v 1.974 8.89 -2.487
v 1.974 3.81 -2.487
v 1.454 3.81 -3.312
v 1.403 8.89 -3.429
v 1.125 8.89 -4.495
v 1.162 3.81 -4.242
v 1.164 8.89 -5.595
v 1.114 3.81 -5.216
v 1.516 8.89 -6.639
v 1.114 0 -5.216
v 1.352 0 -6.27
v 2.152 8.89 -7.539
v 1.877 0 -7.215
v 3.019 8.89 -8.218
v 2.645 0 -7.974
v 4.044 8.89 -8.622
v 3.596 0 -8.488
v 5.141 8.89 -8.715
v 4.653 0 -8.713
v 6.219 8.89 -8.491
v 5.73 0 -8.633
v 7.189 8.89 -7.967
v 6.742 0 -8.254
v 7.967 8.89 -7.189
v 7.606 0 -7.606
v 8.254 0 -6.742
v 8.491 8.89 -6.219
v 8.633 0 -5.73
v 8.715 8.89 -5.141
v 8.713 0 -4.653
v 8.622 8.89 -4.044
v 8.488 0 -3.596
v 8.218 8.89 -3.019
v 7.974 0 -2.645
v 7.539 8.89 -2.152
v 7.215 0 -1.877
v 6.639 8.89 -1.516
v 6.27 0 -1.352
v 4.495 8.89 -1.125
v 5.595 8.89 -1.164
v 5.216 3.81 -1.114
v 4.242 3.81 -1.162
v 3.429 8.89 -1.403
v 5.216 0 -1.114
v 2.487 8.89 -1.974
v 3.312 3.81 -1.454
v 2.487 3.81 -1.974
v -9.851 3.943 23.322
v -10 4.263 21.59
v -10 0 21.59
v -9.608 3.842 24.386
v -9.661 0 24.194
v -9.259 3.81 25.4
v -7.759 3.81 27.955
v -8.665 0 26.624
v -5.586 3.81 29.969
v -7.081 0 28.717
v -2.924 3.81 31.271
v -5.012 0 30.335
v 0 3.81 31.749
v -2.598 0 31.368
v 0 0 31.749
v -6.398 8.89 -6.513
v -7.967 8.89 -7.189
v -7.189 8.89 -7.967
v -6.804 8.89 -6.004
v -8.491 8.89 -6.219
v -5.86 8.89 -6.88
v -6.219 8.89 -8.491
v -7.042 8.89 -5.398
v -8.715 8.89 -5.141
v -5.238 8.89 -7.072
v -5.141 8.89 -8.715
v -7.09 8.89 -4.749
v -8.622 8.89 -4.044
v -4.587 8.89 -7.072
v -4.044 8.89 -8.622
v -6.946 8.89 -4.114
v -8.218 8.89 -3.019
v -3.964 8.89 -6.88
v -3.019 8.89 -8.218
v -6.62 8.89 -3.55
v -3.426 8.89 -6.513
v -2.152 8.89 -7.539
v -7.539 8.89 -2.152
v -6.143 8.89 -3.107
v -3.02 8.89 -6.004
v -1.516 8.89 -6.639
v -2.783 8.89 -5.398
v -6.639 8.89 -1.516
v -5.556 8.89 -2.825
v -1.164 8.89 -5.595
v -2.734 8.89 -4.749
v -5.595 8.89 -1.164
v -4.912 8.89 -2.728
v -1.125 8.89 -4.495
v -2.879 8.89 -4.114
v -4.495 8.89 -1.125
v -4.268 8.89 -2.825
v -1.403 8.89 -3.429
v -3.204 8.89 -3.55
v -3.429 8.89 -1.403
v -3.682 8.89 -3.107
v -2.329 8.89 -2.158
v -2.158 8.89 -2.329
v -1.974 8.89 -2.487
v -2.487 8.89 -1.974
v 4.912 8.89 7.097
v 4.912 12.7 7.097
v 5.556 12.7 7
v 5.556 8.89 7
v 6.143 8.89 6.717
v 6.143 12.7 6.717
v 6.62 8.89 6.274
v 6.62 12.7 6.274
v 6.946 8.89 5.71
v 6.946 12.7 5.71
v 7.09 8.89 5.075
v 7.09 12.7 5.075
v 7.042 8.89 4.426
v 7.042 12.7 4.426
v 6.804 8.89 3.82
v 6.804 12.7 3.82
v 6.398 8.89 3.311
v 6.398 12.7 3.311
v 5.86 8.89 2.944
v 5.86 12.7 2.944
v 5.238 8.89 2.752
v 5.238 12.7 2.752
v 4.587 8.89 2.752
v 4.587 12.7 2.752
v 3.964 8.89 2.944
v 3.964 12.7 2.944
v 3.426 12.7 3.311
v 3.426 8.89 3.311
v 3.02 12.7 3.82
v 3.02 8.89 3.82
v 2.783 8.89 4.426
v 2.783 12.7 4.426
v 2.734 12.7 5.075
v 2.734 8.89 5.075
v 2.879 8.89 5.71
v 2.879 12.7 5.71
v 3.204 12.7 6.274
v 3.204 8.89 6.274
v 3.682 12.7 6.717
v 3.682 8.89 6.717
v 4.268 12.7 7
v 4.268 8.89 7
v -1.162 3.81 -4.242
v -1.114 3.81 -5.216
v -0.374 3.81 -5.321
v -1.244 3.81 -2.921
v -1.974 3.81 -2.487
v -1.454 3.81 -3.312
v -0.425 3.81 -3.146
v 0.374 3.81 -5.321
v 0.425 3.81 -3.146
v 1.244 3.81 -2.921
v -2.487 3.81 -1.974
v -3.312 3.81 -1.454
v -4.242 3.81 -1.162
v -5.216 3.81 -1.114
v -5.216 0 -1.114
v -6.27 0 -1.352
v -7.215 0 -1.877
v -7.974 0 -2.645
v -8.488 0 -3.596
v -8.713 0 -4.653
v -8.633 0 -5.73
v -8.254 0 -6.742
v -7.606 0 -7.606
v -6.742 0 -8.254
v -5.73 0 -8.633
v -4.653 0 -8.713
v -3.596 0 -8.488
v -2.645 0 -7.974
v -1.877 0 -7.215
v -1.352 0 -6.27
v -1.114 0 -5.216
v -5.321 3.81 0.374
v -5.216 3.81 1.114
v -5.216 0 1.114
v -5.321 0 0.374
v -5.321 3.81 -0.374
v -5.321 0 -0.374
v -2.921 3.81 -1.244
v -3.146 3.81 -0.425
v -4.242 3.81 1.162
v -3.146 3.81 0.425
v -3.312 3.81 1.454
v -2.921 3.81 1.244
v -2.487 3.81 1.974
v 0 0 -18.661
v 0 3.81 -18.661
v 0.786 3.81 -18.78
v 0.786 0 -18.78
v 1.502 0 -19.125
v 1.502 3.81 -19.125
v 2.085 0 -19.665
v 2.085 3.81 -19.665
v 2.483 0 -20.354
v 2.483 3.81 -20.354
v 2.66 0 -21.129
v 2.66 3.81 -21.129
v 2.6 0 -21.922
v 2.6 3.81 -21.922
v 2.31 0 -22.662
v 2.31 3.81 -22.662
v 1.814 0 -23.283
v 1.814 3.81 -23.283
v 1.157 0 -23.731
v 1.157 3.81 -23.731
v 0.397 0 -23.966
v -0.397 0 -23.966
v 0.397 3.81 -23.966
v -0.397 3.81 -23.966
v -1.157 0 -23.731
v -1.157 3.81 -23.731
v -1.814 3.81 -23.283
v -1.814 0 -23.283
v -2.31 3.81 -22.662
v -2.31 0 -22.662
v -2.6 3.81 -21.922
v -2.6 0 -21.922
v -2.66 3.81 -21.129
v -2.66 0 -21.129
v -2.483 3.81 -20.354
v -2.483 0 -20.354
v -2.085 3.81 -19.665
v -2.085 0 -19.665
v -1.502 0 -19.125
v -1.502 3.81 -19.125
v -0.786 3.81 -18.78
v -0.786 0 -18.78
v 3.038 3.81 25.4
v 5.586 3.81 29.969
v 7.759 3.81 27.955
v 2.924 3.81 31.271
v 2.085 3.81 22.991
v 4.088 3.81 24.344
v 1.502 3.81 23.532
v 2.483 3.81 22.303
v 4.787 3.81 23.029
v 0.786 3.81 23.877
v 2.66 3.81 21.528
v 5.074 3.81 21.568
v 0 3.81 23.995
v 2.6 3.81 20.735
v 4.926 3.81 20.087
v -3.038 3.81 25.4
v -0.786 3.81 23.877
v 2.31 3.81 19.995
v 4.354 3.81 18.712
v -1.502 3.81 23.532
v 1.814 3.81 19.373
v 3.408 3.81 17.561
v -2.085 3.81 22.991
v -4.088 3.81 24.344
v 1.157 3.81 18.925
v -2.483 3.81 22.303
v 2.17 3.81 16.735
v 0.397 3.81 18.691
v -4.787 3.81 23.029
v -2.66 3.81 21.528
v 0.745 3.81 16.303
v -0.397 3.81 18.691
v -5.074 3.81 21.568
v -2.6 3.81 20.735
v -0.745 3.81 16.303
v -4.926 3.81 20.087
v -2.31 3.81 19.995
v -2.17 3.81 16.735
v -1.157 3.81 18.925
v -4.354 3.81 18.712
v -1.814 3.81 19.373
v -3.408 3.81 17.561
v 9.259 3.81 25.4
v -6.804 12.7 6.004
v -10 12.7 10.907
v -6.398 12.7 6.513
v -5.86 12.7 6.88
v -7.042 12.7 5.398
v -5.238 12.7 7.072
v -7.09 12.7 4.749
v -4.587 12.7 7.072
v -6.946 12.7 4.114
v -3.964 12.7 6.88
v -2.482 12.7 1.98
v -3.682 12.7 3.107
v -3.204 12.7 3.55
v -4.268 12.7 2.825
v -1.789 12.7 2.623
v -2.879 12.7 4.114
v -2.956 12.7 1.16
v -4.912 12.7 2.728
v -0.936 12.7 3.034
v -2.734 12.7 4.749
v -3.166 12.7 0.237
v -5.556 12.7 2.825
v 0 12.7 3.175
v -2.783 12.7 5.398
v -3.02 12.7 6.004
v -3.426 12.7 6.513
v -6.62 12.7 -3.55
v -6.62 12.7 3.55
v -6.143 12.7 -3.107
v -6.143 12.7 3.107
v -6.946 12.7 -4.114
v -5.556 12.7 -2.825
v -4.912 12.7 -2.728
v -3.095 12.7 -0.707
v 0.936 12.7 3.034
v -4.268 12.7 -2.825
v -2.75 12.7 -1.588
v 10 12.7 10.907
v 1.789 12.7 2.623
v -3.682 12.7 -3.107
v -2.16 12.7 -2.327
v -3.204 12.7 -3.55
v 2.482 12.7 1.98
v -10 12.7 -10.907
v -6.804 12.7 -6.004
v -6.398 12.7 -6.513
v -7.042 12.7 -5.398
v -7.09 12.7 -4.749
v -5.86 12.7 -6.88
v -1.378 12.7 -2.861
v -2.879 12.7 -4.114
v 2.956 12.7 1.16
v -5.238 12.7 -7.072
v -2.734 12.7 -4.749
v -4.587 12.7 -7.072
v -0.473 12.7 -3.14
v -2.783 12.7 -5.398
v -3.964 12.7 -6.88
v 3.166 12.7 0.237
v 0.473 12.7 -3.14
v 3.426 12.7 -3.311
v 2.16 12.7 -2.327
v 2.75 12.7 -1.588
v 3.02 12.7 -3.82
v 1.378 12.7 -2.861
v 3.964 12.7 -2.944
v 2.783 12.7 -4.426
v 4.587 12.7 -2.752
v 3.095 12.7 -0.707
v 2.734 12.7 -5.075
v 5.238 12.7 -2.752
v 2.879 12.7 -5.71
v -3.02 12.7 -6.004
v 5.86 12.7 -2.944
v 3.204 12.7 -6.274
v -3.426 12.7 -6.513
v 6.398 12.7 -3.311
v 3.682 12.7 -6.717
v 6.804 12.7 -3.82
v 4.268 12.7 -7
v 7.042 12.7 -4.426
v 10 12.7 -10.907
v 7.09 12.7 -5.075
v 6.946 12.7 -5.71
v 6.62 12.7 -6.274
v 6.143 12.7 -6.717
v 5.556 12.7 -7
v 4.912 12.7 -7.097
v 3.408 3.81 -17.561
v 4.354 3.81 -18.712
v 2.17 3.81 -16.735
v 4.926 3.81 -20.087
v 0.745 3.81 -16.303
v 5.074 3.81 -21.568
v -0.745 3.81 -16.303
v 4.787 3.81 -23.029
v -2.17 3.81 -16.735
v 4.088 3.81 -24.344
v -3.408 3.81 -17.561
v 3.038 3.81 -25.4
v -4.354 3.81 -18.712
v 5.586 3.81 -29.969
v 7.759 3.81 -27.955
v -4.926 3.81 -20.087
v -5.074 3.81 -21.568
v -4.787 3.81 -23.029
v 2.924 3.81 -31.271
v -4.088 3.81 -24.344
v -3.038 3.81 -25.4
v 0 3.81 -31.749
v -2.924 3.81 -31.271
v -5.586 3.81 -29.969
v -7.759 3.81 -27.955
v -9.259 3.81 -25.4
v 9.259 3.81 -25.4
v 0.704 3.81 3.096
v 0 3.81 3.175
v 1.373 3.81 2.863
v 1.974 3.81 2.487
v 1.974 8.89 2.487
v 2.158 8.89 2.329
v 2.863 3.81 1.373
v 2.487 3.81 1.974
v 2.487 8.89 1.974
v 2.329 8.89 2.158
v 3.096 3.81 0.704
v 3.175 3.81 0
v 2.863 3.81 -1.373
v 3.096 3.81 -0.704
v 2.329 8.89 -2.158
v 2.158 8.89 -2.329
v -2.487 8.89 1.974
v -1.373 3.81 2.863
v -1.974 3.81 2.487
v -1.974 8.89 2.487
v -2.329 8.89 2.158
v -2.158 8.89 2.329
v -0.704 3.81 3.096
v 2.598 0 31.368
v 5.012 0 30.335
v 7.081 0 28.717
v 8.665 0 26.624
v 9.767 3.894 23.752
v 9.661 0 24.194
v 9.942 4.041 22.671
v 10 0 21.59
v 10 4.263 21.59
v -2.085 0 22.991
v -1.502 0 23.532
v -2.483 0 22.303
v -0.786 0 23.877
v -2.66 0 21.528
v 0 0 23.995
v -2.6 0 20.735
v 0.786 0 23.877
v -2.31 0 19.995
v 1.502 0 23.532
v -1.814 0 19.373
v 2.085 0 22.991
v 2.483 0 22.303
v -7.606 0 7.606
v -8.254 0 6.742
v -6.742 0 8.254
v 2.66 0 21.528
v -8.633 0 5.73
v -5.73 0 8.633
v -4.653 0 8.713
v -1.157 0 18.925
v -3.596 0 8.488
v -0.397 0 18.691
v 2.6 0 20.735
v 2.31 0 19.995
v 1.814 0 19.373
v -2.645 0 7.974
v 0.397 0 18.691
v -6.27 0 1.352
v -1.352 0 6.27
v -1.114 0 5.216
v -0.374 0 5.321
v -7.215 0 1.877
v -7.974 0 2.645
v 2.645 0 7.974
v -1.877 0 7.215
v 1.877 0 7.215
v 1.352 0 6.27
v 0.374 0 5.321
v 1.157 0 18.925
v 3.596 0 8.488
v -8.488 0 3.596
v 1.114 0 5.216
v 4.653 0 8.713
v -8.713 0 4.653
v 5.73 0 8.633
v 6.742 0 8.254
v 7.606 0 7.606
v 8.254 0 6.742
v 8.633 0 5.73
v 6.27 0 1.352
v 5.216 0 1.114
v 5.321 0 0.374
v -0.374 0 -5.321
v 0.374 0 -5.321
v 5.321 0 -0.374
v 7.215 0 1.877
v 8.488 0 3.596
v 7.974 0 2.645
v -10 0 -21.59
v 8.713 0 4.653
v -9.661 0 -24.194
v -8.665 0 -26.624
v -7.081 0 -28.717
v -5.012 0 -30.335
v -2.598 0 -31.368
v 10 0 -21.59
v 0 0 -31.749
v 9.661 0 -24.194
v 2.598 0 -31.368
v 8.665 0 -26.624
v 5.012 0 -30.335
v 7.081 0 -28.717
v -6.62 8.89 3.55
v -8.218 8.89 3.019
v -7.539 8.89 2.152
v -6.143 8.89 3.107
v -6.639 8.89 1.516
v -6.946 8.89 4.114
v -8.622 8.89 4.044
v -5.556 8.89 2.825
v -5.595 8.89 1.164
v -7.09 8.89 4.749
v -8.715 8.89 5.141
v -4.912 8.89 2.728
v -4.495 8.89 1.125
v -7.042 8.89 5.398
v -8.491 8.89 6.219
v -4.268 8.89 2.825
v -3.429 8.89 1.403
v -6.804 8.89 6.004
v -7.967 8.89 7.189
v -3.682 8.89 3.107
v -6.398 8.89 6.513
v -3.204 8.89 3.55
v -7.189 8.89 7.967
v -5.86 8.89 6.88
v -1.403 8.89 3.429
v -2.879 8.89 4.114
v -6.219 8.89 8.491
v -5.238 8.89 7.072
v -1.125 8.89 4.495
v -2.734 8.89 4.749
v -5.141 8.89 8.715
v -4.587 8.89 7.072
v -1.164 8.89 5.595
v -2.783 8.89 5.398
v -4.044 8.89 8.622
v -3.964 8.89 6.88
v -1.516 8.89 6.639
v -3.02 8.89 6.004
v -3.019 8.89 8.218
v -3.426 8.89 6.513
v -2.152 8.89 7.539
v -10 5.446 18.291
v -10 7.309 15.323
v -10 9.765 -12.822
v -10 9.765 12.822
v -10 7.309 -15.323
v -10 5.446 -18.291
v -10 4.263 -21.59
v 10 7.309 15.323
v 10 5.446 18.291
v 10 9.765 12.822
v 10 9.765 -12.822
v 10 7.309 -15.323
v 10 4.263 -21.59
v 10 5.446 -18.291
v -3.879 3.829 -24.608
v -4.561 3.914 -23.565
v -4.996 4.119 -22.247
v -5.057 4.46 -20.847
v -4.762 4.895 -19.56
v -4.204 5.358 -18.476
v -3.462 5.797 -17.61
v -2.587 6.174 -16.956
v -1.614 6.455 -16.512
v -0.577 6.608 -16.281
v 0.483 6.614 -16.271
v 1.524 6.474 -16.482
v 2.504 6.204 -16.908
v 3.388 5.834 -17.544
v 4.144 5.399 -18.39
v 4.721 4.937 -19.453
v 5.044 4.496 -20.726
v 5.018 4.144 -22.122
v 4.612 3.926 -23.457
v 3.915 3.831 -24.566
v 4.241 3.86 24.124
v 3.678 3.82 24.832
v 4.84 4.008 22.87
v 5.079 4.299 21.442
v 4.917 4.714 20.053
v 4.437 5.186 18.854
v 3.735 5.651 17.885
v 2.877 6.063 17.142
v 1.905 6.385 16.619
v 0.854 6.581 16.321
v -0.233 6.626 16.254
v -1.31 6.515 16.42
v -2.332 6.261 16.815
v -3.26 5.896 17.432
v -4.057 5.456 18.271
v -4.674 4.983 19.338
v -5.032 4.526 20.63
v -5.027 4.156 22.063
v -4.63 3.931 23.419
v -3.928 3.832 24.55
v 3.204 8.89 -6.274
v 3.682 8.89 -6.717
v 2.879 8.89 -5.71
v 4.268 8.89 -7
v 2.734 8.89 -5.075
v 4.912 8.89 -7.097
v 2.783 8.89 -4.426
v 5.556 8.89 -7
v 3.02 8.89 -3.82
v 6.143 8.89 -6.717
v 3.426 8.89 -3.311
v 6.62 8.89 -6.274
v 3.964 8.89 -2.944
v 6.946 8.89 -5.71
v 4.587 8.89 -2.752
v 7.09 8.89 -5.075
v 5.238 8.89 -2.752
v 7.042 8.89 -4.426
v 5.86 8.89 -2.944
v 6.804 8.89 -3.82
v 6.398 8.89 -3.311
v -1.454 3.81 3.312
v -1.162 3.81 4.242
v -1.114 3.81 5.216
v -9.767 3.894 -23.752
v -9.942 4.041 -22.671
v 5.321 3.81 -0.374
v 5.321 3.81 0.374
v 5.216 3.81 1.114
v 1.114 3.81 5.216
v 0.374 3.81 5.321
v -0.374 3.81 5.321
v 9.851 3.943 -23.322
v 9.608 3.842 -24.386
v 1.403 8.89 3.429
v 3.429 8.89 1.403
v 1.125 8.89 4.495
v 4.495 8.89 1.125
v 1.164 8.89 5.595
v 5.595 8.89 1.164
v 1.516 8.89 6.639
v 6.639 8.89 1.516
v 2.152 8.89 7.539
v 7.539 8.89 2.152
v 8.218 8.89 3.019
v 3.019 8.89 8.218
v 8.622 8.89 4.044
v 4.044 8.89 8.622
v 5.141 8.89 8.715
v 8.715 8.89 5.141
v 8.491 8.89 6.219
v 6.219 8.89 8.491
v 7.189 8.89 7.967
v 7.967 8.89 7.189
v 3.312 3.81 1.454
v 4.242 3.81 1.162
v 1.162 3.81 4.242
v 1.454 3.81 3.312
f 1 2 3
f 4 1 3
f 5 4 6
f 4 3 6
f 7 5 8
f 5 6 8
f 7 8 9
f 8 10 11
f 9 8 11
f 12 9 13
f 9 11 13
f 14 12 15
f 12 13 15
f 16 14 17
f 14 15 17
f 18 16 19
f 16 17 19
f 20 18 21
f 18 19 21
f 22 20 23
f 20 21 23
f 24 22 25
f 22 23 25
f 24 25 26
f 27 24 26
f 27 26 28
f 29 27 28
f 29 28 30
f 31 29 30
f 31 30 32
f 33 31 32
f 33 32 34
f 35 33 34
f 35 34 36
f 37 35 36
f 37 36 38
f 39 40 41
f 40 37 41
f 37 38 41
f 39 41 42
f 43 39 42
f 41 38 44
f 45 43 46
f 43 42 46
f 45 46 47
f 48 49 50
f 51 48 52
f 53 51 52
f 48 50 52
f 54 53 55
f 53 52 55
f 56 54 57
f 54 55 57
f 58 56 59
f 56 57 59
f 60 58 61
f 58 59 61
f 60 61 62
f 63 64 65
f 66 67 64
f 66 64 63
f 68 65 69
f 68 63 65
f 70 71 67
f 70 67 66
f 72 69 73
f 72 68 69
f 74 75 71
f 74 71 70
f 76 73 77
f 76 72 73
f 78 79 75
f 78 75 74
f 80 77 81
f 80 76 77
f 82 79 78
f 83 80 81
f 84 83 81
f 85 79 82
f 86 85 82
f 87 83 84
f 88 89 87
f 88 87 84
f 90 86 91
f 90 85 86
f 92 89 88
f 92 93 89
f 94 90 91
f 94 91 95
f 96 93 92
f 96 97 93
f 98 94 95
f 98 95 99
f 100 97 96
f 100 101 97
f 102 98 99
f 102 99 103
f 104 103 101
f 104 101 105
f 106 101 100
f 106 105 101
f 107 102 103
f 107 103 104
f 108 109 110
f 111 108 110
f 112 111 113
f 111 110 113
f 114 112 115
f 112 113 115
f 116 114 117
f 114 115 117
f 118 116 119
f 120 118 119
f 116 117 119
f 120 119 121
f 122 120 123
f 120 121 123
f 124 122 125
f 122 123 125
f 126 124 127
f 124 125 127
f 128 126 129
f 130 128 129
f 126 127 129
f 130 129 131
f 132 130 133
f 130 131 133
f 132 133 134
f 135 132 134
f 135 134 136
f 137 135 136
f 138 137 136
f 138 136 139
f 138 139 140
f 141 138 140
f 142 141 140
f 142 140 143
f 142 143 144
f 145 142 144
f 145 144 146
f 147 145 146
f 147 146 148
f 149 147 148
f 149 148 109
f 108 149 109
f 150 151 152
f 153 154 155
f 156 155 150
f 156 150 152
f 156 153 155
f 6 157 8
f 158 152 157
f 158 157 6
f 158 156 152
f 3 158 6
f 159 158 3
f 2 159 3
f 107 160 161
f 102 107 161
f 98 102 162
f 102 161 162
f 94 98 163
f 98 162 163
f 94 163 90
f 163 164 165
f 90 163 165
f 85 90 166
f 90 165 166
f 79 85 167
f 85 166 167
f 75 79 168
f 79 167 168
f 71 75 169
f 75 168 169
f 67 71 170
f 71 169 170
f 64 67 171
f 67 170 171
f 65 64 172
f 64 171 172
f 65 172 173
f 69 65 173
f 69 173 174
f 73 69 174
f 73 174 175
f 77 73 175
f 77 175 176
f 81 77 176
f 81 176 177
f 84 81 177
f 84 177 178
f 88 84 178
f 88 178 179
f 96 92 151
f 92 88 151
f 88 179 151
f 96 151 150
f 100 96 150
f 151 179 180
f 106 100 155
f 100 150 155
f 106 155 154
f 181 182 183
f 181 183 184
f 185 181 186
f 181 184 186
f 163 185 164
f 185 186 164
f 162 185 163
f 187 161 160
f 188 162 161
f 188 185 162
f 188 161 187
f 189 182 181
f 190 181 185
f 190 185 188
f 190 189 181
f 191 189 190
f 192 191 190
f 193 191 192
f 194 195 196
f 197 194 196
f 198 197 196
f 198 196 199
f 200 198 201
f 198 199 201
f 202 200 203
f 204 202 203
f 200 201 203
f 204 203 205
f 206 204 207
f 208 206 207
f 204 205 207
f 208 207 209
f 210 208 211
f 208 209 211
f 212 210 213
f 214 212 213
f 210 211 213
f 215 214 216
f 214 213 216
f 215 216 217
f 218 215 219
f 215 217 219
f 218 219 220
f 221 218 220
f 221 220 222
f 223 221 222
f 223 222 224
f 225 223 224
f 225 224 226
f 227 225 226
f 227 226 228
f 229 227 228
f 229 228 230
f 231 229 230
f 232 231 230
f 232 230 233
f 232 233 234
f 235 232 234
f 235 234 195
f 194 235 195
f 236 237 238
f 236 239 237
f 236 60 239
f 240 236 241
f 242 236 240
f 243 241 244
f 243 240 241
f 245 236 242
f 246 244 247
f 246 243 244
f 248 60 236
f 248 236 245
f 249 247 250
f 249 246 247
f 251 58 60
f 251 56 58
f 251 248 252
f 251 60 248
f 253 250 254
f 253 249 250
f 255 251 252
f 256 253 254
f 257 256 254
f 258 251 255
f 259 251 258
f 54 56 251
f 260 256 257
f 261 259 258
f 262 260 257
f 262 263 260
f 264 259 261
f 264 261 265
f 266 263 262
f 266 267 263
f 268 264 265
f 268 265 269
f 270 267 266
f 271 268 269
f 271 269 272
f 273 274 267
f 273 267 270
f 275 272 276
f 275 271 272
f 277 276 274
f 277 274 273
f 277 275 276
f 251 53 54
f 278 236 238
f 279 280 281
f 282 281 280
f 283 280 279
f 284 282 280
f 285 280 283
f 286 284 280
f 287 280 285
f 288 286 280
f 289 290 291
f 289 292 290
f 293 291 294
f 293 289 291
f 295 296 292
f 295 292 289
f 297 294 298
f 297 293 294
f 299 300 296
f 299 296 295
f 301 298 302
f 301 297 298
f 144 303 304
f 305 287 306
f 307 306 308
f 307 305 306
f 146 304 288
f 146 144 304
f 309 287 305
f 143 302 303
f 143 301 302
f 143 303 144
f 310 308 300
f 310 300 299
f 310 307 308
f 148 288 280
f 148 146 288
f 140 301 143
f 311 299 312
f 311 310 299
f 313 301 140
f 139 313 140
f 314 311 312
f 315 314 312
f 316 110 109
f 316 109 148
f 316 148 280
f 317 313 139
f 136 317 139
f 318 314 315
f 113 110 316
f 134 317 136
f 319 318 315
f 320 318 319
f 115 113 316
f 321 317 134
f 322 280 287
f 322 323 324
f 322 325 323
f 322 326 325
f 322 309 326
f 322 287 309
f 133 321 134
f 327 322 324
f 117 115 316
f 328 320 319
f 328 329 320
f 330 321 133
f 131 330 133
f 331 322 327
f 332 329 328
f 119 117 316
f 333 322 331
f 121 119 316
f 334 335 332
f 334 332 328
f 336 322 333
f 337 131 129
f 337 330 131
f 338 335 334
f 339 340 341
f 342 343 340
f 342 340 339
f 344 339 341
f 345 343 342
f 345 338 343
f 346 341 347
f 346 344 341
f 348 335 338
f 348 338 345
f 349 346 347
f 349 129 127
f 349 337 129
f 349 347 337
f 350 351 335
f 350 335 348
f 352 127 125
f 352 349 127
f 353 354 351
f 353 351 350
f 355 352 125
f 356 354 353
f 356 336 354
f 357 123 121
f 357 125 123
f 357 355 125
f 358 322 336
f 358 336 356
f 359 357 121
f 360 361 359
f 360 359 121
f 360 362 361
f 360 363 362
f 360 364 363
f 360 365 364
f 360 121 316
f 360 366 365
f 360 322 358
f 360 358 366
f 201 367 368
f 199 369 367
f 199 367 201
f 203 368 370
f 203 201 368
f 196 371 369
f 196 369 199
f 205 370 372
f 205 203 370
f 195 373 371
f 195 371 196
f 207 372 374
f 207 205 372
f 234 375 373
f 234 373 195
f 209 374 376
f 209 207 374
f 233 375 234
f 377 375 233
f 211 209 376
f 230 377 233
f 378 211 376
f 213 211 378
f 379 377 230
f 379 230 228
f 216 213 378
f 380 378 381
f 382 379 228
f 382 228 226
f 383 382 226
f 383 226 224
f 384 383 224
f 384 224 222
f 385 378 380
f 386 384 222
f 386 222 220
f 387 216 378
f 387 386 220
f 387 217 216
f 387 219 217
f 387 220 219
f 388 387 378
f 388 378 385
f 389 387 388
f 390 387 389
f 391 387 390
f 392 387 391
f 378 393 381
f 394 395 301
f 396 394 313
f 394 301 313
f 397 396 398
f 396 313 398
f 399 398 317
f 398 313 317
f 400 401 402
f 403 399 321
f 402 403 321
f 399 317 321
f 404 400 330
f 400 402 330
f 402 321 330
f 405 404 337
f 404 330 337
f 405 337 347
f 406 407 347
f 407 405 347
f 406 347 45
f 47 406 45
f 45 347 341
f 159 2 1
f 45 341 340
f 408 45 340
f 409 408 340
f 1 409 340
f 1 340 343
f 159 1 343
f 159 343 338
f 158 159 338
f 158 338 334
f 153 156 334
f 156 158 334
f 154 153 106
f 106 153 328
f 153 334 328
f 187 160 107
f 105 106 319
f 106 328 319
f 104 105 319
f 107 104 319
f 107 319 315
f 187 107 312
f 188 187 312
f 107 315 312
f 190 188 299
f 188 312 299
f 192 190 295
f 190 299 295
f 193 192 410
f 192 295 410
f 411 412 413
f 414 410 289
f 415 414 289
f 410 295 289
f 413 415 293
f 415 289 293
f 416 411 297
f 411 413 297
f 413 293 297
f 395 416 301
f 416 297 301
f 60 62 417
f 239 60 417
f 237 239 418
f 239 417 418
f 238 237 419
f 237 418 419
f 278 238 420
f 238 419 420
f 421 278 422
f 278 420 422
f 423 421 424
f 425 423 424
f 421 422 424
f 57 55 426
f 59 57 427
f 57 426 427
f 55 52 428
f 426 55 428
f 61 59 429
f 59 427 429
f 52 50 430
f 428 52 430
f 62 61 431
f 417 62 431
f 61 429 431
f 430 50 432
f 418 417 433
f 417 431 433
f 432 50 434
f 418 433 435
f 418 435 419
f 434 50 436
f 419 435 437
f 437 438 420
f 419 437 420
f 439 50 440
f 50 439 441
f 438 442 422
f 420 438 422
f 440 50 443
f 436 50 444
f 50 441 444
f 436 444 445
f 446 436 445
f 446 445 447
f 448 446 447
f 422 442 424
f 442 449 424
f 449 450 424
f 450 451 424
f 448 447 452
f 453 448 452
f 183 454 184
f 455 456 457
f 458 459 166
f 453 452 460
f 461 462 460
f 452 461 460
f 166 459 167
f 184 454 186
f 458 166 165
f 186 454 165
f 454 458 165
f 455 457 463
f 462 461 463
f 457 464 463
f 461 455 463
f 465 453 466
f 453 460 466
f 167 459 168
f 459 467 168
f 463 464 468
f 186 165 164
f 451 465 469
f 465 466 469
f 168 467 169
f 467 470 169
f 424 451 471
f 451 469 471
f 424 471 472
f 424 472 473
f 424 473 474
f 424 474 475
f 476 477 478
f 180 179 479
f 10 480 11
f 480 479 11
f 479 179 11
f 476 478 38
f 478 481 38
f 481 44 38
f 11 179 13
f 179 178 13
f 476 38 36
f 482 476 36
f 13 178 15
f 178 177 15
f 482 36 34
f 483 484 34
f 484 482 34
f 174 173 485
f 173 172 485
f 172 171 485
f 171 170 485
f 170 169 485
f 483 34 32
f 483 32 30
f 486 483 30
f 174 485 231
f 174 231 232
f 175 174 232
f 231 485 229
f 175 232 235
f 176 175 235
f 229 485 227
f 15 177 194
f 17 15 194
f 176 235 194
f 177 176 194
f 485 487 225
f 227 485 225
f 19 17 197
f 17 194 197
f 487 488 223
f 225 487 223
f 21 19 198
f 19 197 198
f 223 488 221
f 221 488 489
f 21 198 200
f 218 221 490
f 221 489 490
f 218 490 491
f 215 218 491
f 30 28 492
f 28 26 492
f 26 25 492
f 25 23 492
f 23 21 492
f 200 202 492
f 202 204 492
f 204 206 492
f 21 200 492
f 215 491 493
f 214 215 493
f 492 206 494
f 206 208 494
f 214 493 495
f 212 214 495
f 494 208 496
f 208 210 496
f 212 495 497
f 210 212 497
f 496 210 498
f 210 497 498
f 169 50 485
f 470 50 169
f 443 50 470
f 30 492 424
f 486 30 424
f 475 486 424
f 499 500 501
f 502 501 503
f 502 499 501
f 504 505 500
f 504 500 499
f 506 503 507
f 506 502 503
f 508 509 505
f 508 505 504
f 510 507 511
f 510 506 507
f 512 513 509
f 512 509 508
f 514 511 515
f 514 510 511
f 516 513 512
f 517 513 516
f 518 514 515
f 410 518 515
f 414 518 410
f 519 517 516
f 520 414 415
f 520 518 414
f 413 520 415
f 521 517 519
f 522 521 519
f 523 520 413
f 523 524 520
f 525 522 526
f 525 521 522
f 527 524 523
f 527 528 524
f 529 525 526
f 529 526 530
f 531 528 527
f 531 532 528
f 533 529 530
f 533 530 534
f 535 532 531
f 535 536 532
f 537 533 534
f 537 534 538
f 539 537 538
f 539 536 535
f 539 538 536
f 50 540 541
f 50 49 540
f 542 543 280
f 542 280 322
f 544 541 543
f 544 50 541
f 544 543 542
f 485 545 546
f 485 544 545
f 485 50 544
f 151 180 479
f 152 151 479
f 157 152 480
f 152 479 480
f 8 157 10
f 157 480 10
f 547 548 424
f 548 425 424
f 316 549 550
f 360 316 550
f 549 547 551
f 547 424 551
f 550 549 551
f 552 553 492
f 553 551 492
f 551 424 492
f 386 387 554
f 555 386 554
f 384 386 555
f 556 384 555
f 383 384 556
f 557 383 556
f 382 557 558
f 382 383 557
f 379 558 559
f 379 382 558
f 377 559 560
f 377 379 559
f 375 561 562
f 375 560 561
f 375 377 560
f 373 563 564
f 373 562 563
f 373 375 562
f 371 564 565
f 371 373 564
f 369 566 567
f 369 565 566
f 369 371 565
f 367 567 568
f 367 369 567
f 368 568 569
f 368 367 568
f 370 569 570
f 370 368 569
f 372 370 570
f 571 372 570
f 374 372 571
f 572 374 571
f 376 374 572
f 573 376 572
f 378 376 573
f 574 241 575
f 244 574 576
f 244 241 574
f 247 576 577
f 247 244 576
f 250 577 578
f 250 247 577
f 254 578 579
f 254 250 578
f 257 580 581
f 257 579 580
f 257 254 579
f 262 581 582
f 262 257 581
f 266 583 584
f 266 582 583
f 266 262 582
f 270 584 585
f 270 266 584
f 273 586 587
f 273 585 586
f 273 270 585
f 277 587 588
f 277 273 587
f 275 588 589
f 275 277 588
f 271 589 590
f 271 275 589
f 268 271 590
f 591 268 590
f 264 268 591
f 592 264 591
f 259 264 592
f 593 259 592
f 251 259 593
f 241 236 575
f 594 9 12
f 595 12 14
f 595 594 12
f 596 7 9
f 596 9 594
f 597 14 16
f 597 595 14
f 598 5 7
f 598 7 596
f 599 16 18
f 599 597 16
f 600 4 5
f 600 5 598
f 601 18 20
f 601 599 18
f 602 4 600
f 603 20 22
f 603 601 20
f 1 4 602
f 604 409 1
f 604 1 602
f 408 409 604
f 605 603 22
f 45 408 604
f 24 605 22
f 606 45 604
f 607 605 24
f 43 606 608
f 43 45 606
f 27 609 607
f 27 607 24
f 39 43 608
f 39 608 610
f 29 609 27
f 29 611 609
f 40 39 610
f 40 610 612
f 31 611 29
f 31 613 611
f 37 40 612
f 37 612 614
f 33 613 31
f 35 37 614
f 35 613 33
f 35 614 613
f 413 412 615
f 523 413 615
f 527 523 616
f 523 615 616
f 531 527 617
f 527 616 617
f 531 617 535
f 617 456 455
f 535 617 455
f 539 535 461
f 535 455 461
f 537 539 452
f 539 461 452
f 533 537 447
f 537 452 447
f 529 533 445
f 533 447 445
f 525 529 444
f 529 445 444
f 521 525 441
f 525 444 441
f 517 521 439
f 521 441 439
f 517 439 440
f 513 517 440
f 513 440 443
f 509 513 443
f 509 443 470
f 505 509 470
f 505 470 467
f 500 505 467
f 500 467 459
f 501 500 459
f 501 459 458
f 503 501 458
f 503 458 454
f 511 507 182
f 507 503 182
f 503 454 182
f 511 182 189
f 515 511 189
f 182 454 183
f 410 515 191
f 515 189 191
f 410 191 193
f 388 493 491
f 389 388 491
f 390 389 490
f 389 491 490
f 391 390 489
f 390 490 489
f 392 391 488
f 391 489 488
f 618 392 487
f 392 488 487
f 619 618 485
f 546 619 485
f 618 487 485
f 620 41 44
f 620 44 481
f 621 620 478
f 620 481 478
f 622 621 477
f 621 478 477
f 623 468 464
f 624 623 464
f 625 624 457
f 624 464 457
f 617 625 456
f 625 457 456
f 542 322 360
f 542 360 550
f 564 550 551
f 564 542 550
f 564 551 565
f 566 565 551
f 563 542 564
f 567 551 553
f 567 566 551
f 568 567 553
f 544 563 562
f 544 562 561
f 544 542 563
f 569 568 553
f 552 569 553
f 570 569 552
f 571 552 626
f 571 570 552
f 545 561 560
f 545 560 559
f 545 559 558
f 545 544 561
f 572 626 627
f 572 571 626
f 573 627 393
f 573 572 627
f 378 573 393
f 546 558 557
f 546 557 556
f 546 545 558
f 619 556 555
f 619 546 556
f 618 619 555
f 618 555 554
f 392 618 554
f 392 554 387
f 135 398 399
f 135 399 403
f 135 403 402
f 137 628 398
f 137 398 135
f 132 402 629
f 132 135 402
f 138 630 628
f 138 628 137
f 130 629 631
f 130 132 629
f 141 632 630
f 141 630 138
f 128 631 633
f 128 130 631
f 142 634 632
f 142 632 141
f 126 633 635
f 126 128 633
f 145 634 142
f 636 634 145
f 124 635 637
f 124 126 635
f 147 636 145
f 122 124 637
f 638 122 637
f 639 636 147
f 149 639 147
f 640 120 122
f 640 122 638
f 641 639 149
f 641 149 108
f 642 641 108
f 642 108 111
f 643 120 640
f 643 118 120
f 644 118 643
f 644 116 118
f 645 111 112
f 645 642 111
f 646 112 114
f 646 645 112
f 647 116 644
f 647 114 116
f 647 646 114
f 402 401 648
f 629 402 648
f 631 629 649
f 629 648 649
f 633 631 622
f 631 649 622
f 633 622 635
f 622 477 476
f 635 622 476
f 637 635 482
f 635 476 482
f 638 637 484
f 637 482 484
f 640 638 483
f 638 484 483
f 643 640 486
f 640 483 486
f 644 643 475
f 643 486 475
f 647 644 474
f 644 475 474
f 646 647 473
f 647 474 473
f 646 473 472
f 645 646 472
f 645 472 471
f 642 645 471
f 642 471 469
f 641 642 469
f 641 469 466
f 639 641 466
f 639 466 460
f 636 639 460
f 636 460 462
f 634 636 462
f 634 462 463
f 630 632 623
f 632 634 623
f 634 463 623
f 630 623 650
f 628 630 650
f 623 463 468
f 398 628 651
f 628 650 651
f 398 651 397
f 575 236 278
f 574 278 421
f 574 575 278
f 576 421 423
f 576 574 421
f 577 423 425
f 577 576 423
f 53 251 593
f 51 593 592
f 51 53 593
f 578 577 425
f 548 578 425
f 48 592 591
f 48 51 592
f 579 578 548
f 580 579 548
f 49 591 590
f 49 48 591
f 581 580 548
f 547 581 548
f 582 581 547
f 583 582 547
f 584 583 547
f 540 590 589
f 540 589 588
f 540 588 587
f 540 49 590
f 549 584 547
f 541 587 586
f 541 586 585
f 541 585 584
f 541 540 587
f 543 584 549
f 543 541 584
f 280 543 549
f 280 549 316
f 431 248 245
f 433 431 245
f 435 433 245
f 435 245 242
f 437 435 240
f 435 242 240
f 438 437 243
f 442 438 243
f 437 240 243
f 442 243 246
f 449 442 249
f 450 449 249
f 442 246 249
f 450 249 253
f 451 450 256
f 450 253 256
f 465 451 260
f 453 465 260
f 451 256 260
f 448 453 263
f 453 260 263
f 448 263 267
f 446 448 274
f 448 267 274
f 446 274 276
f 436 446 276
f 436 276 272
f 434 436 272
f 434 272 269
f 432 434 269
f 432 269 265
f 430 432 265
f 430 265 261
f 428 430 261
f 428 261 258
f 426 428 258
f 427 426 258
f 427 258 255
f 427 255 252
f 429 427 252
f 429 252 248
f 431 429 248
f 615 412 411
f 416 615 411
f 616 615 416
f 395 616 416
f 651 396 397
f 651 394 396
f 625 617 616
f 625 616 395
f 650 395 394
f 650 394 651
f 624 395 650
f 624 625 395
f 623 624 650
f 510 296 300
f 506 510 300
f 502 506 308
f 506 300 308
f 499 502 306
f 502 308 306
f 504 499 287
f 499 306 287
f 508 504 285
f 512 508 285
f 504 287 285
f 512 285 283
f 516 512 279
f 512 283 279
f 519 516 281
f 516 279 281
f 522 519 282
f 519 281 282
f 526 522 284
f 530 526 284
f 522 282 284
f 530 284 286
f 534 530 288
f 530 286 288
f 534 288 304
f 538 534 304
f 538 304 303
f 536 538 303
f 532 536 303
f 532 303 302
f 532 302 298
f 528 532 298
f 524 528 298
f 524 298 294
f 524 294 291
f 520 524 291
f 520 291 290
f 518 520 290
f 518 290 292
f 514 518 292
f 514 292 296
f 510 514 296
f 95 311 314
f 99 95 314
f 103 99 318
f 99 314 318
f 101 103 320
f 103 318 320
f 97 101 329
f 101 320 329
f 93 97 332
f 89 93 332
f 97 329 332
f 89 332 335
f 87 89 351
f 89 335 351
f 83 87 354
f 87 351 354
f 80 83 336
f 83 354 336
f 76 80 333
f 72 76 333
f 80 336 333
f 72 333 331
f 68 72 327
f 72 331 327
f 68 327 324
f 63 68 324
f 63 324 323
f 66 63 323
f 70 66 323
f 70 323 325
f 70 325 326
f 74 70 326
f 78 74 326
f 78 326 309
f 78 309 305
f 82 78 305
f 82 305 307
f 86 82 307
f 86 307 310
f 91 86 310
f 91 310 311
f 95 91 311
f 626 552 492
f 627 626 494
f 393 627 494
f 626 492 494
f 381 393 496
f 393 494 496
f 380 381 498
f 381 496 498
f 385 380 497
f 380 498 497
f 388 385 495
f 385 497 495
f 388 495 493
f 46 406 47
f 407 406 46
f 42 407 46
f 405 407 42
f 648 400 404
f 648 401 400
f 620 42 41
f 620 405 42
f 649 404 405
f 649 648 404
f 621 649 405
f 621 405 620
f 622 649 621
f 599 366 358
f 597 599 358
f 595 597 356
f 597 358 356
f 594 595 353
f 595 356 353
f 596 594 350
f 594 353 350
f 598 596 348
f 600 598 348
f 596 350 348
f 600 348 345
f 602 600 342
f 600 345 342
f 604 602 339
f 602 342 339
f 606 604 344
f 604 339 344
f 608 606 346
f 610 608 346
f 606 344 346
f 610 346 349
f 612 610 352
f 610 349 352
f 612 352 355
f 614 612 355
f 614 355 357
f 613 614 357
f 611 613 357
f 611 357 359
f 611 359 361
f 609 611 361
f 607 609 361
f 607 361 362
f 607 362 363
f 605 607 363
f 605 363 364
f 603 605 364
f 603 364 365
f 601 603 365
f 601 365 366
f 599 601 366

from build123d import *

# Parameters (mm, degrees)
SKETCH1_W               = 20
SKETCH1_H               = 63.5
BOSS_EXTRUDE1_DEPTH     = 12.7
SKETCH2_R               = 3.175
SKETCH2_R_2             = 2.1844
CUT_EXTRUDE1_DEPTH      = 36.62797356
CUT_EXTRUDE2_DEPTH      = 36.62797356
CUT_EXTRUDE2_DEPTH_BACK = 36.62797356
SKETCH4_R               = 3.81
CUT_EXTRUDE3_DEPTH      = 8.89
SKETCH4_3_R             = 3.81
SKETCH4_3_R_2           = 2.1844
SKETCH4_3_R_3           = 5.334
SKETCH4_3_R_4           = 3.175
CUT_EXTRUDE4_DEPTH      = 3.81
SKETCH6_R               = 5.08
SKETCH6_R_2             = 2.667
CUT_EXTRUDE5_DEPTH      = 8.89
SKETCH6_4_R             = 2.667
CUT_EXTRUDE6_DEPTH      = 35.454239272
FILLET1_R               = 10.16


with BuildPart() as part:
    # Sketch1 → Boss-Extrude1 (new body)
    with BuildSketch(Plane(origin=(0, 0, 0), x_dir=(1, 0, 0), z_dir=(0, 1, 0))):
        Rectangle(SKETCH1_W, SKETCH1_H)
    extrude(amount=BOSS_EXTRUDE1_DEPTH)

    # Sketch2 → Cut-Extrude1 (cut, through all)
    with BuildSketch(Plane(origin=(0, 12.7, 0), x_dir=(1, 0, 0), z_dir=(0, 1, 0))):
        with Locations(Location((0, 0, 0), (0, 0, 270))):
            Circle(SKETCH2_R)
        with Locations(Location((-4.912200098, 4.912200098, 0), (0, 0, 270))):
            Circle(SKETCH2_R_2)
        with Locations(Location((4.912200098, -4.912200098, 0), (0, 0, 270))):
            Circle(SKETCH2_R_2)
        with Locations(Location((4.912200098, 4.912200098, 0), (0, 0, 90))):
            Circle(SKETCH2_R_2)
        with Locations(Location((-4.912200098, -4.912200098, 0), (0, 0, 90))):
            Circle(SKETCH2_R_2)
    extrude(amount=-CUT_EXTRUDE1_DEPTH, mode=Mode.SUBTRACT)

    # Sketch3 → Cut-Extrude2 (cut, two sides: drawn at the far end of the back side and taken through both)
    with BuildSketch(Plane(origin=(0, 0, 0), x_dir=(0, 0, -1), z_dir=(1, 0, 0)).offset(-CUT_EXTRUDE2_DEPTH_BACK)):
        with BuildLine():
            Line((31.75, 3.81), (31.75, 12.7))
            Line((31.75, 12.7), (10.906600098, 12.7))
            ThreePointArc((10.906600098, 12.7), (16.898665682, 6.209564949), (25.4, 3.81))
            Line((25.4, 3.81), (31.75, 3.81))
        make_face()
        with BuildLine():
            ThreePointArc((-25.4, 3.81), (-16.898665682, 6.209564949), (-10.906600098, 12.7))
            Line((-10.906600098, 12.7), (-31.75, 12.7))
            Line((-31.75, 12.7), (-31.75, 3.81))
            Line((-31.75, 3.81), (-25.4, 3.81))
        make_face()
    extrude(amount=CUT_EXTRUDE2_DEPTH + CUT_EXTRUDE2_DEPTH_BACK, mode=Mode.SUBTRACT)

    # Sketch4 → Cut-Extrude3 (cut)
    with BuildSketch(Plane.XZ):
        with Locations((-4.912200098, -4.912200098)):
            Circle(SKETCH4_R)
        with Locations((4.912200098, 4.912200098)):
            Circle(SKETCH4_R)
        with Locations((-4.912200098, 4.912200098)):
            Circle(SKETCH4_R)
        with Locations((4.912200098, -4.912200098)):
            Circle(SKETCH4_R)
    extrude(amount=-CUT_EXTRUDE3_DEPTH, mode=Mode.SUBTRACT)

    # Sketch4<3> → Cut-Extrude4 (cut)
    # profile 1 of 28: a face of its own
    with BuildSketch(Plane.XZ):
        with Locations((-4.912200098, 4.912200098)):
            Circle(SKETCH4_3_R)
        with Locations(Location((-4.912200098, 4.912200098, 0), (0, 0, 270))):
            Circle(SKETCH4_3_R_2, mode=Mode.SUBTRACT)
    # profile 2 of 28: a face of its own
    with BuildSketch(Plane.XZ):
        Circle(SKETCH4_3_R_3)
        with Locations(Location((0, 0, 0), (0, 0, 90))):
            Circle(SKETCH4_3_R_4, mode=Mode.SUBTRACT)
    # profile 3 of 28: a face of its own
    with BuildSketch(Plane.XZ):
        Circle(SKETCH4_3_R_3)
    # profile 4 of 28: a face of its own
    with BuildSketch(Plane.XZ):
        with Locations(Location((-4.912200098, 4.912200098, 0), (0, 0, 270))):
            Circle(SKETCH4_3_R_2)
    # profile 5 of 28: a face of its own
    with BuildSketch(Plane.XZ):
        with Locations((-4.912200098, 4.912200098)):
            Circle(SKETCH4_3_R)
    # profile 6 of 28: a face of its own
    with BuildSketch(Plane.XZ):
        Circle(SKETCH4_3_R_3)
        with Locations(Location((0, 0, 0), (0, 0, 90))):
            Circle(SKETCH4_3_R_4, mode=Mode.SUBTRACT)
    # profile 7 of 28: a face of its own
    with BuildSketch(Plane.XZ):
        with Locations((-4.912200098, -4.912200098)):
            Circle(SKETCH4_3_R)
    # profile 8 of 28: a face of its own
    with BuildSketch(Plane.XZ):
        Circle(SKETCH4_3_R_3)
        with Locations(Location((0, 0, 0), (0, 0, 90))):
            Circle(SKETCH4_3_R_4, mode=Mode.SUBTRACT)
    # profile 9 of 28: a face of its own
    with BuildSketch(Plane.XZ):
        with Locations((-4.912200098, -4.912200098)):
            Circle(SKETCH4_3_R)
        with Locations(Location((-4.912200098, -4.912200098, 0), (0, 0, 90))):
            Circle(SKETCH4_3_R_2, mode=Mode.SUBTRACT)
    # profile 10 of 28: a face of its own
    with BuildSketch(Plane.XZ):
        Circle(SKETCH4_3_R_3)
    # profile 11 of 28: a face of its own
    with BuildSketch(Plane.XZ):
        with Locations(Location((-4.912200098, -4.912200098, 0), (0, 0, 90))):
            Circle(SKETCH4_3_R_2)
    # profile 12 of 28: a face of its own
    with BuildSketch(Plane.XZ):
        with BuildLine():
            ThreePointArc((1.973854475, -2.486870224), (1.04518229, -2.998035854), (0, -3.175))
            Line((0, -3.175), (0, -5.334))
            ThreePointArc((0, -5.334), (0.560277089, -5.304492962), (1.114355409, -5.216298306))
            ThreePointArc((1.114355409, -5.216298306), (1.278123958, -3.767826643), (1.973854475, -2.486870224))
        make_face()
    # profile 13 of 28: a face of its own
    with BuildSketch(Plane.XZ):
        with BuildLine():
            Line((0, -5.334), (0, -3.175))
            ThreePointArc((0, -3.175), (-1.04518229, -2.998035854), (-1.973854475, -2.486870224))
            ThreePointArc((-1.973854475, -2.486870224), (-1.326729639, -3.623595587), (-1.102200098, -4.912200098))
            ThreePointArc((-1.102200098, -4.912200098), (-1.105240139, -5.064370621), (-1.114355409, -5.216298306))
            ThreePointArc((-1.114355409, -5.216298306), (-0.560277089, -5.304492962), (0, -5.334))
        make_face()
    # profile 14 of 28: a face of its own
    with BuildSketch(Plane.XZ):
        with Locations((4.912200098, -4.912200098)):
            Circle(SKETCH4_3_R)
        with Locations(Location((4.912200098, -4.912200098, 0), (0, 0, 270))):
            Circle(SKETCH4_3_R_2, mode=Mode.SUBTRACT)
    # profile 15 of 28: a face of its own
    with BuildSketch(Plane.XZ):
        Circle(SKETCH4_3_R_3)
        with Locations(Location((0, 0, 0), (0, 0, 90))):
            Circle(SKETCH4_3_R_4, mode=Mode.SUBTRACT)
    # profile 16 of 28: a face of its own
    with BuildSketch(Plane.XZ):
        Circle(SKETCH4_3_R_3)
    # profile 17 of 28: a face of its own
    with BuildSketch(Plane.XZ):
        with Locations(Location((4.912200098, -4.912200098, 0), (0, 0, 270))):
            Circle(SKETCH4_3_R_2)
    # profile 18 of 28: a face of its own
    with BuildSketch(Plane.XZ):
        with Locations((4.912200098, -4.912200098)):
            Circle(SKETCH4_3_R)
    # profile 19 of 28: a face of its own
    with BuildSketch(Plane.XZ):
        Circle(SKETCH4_3_R_3)
        with Locations(Location((0, 0, 0), (0, 0, 90))):
            Circle(SKETCH4_3_R_4, mode=Mode.SUBTRACT)
    # profile 20 of 28: a face of its own
    with BuildSketch(Plane.XZ):
        with Locations((4.912200098, 4.912200098)):
            Circle(SKETCH4_3_R)
    # profile 21 of 28: a face of its own
    with BuildSketch(Plane.XZ):
        Circle(SKETCH4_3_R_3)
        with Locations(Location((0, 0, 0), (0, 0, 90))):
            Circle(SKETCH4_3_R_4, mode=Mode.SUBTRACT)
    # profile 22 of 28: a face of its own
    with BuildSketch(Plane.XZ):
        with Locations((4.912200098, 4.912200098)):
            Circle(SKETCH4_3_R)
        with Locations(Location((4.912200098, 4.912200098, 0), (0, 0, 90))):
            Circle(SKETCH4_3_R_2, mode=Mode.SUBTRACT)
    # profile 23 of 28: a face of its own
    with BuildSketch(Plane.XZ):
        Circle(SKETCH4_3_R_3)
    # profile 24 of 28: a face of its own
    with BuildSketch(Plane.XZ):
        with Locations(Location((4.912200098, 4.912200098, 0), (0, 0, 90))):
            Circle(SKETCH4_3_R_2)
    # profile 25 of 28: a face of its own
    with BuildSketch(Plane.XZ):
        with BuildLine():
            Line((0, 3.175), (0, 5.334))
            ThreePointArc((0, 5.334), (-0.560277089, 5.304492962), (-1.114355409, 5.216298306))
            ThreePointArc((-1.114355409, 5.216298306), (-1.105240139, 5.064370621), (-1.102200098, 4.912200098))
            ThreePointArc((-1.102200098, 4.912200098), (-1.326729639, 3.623595587), (-1.973854475, 2.486870224))
            ThreePointArc((-1.973854475, 2.486870224), (-1.04518229, 2.998035854), (0, 3.175))
        make_face()
    # profile 26 of 28: a face of its own
    with BuildSketch(Plane.XZ):
        with BuildLine():
            ThreePointArc((1.114355409, 5.216298306), (0.560277089, 5.304492962), (0, 5.334))
            Line((0, 5.334), (0, 3.175))
            ThreePointArc((0, 3.175), (1.04518229, 2.998035854), (1.973854475, 2.486870224))
            ThreePointArc((1.973854475, 2.486870224), (1.278123958, 3.767826643), (1.114355409, 5.216298306))
        make_face()
    # profile 27 of 28: a face of its own
    with BuildSketch(Plane.XZ):
        with BuildLine():
            ThreePointArc((1.973854475, 2.486870224), (1.04518229, 2.998035854), (0, 3.175))
            Line((0, 3.175), (0, -3.175))
            ThreePointArc((0, -3.175), (1.04518229, -2.998035854), (1.973854475, -2.486870224))
            ThreePointArc((1.973854475, -2.486870224), (2.218123262, -2.218123262), (2.486870224, -1.973854475))
            ThreePointArc((2.486870224, -1.973854475), (2.998035854, -1.04518229), (3.175, 0))
            ThreePointArc((3.175, 0), (2.998035854, 1.04518229), (2.486870224, 1.973854475))
            ThreePointArc((2.486870224, 1.973854475), (2.218123262, 2.218123262), (1.973854475, 2.486870224))
        make_face()
    # profile 28 of 28: a face of its own
    with BuildSketch(Plane.XZ):
        with BuildLine():
            Line((0, -3.175), (0, 3.175))
            ThreePointArc((0, 3.175), (-1.04518229, 2.998035854), (-1.973854475, 2.486870224))
            ThreePointArc((-1.973854475, 2.486870224), (-2.218123262, 2.218123262), (-2.486870224, 1.973854475))
            ThreePointArc((-2.486870224, 1.973854475), (-3.175, 0), (-2.486870224, -1.973854475))
            ThreePointArc((-2.486870224, -1.973854475), (-2.218123262, -2.218123262), (-1.973854475, -2.486870224))
            ThreePointArc((-1.973854475, -2.486870224), (-1.04518229, -2.998035854), (0, -3.175))
        make_face()
    extrude(amount=-CUT_EXTRUDE4_DEPTH, mode=Mode.SUBTRACT)

    # Sketch6 → Cut-Extrude5 (cut)
    # profile 1 of 3: a face of its own
    with BuildSketch(Plane(origin=(0, 3.81, 0), x_dir=(1, 0, 0), z_dir=(0, 1, 0))):
        with Locations((0, -21.328300049)):
            Circle(SKETCH6_R)
        with Locations((0, -21.328300049)):
            Circle(SKETCH6_R_2, mode=Mode.SUBTRACT)
    # profile 2 of 3: a face of its own
    with BuildSketch(Plane(origin=(0, 3.81, 0), x_dir=(1, 0, 0), z_dir=(0, 1, 0))):
        with Locations((0, -21.328300049)):
            Circle(SKETCH6_R_2)
    # profile 3 of 3: a face of its own
    with BuildSketch(Plane(origin=(0, 3.81, 0), x_dir=(1, 0, 0), z_dir=(0, 1, 0))):
        with Locations((0, 21.328300049)):
            Circle(SKETCH6_R)
    extrude(amount=CUT_EXTRUDE5_DEPTH, mode=Mode.SUBTRACT)

    # Sketch6<4> → Cut-Extrude6 (cut, through all)
    with BuildSketch(Plane(origin=(0, 3.81, 0), x_dir=(1, 0, 0), z_dir=(0, 1, 0))):
        with Locations(Location((0, 21.328300049, 0), (0, 0, 270))):
            Circle(SKETCH6_4_R)
        with Locations(Location((0, -21.328300049, 0), (0, 0, 270))):
            Circle(SKETCH6_4_R)
    extrude(amount=-CUT_EXTRUDE6_DEPTH, mode=Mode.SUBTRACT)

    # Fillet1
    # the kernel refuses this fillet: 10.16 mm, written as the material it takes off along each edge
    with BuildSketch(Plane(origin=(10, -25.4, 31.75), x_dir=(0, 0, -1), z_dir=(0, 1, 0)), Plane(origin=(10, -25.4, -31.75), x_dir=(-1, 0, 0), z_dir=(0, 1, 0))) as fillet1_piece_1:
        with BuildLine():
            CenterArc((FILLET1_R, FILLET1_R), FILLET1_R, 180, 90)
            Line((0, FILLET1_R), (0, 0))
            Line((0, 0), (FILLET1_R, 0))
        make_face()
    extrude(amount=54.61, mode=Mode.SUBTRACT)
    with BuildSketch(Plane(origin=(-10, -25.4, 31.75), x_dir=(0, 0, -1), z_dir=(0, 1, 0)), Plane(origin=(-10, -25.4, -31.75), x_dir=(1, 0, 0), z_dir=(0, 1, 0))) as fillet1_piece_2:
        with BuildLine():
            CenterArc((FILLET1_R, -FILLET1_R), FILLET1_R, 90, 90)
            Line((0, -FILLET1_R), (0, 0))
            Line((0, 0), (FILLET1_R, 0))
        make_face()
    extrude(amount=54.61, mode=Mode.SUBTRACT)


solid = part.part
